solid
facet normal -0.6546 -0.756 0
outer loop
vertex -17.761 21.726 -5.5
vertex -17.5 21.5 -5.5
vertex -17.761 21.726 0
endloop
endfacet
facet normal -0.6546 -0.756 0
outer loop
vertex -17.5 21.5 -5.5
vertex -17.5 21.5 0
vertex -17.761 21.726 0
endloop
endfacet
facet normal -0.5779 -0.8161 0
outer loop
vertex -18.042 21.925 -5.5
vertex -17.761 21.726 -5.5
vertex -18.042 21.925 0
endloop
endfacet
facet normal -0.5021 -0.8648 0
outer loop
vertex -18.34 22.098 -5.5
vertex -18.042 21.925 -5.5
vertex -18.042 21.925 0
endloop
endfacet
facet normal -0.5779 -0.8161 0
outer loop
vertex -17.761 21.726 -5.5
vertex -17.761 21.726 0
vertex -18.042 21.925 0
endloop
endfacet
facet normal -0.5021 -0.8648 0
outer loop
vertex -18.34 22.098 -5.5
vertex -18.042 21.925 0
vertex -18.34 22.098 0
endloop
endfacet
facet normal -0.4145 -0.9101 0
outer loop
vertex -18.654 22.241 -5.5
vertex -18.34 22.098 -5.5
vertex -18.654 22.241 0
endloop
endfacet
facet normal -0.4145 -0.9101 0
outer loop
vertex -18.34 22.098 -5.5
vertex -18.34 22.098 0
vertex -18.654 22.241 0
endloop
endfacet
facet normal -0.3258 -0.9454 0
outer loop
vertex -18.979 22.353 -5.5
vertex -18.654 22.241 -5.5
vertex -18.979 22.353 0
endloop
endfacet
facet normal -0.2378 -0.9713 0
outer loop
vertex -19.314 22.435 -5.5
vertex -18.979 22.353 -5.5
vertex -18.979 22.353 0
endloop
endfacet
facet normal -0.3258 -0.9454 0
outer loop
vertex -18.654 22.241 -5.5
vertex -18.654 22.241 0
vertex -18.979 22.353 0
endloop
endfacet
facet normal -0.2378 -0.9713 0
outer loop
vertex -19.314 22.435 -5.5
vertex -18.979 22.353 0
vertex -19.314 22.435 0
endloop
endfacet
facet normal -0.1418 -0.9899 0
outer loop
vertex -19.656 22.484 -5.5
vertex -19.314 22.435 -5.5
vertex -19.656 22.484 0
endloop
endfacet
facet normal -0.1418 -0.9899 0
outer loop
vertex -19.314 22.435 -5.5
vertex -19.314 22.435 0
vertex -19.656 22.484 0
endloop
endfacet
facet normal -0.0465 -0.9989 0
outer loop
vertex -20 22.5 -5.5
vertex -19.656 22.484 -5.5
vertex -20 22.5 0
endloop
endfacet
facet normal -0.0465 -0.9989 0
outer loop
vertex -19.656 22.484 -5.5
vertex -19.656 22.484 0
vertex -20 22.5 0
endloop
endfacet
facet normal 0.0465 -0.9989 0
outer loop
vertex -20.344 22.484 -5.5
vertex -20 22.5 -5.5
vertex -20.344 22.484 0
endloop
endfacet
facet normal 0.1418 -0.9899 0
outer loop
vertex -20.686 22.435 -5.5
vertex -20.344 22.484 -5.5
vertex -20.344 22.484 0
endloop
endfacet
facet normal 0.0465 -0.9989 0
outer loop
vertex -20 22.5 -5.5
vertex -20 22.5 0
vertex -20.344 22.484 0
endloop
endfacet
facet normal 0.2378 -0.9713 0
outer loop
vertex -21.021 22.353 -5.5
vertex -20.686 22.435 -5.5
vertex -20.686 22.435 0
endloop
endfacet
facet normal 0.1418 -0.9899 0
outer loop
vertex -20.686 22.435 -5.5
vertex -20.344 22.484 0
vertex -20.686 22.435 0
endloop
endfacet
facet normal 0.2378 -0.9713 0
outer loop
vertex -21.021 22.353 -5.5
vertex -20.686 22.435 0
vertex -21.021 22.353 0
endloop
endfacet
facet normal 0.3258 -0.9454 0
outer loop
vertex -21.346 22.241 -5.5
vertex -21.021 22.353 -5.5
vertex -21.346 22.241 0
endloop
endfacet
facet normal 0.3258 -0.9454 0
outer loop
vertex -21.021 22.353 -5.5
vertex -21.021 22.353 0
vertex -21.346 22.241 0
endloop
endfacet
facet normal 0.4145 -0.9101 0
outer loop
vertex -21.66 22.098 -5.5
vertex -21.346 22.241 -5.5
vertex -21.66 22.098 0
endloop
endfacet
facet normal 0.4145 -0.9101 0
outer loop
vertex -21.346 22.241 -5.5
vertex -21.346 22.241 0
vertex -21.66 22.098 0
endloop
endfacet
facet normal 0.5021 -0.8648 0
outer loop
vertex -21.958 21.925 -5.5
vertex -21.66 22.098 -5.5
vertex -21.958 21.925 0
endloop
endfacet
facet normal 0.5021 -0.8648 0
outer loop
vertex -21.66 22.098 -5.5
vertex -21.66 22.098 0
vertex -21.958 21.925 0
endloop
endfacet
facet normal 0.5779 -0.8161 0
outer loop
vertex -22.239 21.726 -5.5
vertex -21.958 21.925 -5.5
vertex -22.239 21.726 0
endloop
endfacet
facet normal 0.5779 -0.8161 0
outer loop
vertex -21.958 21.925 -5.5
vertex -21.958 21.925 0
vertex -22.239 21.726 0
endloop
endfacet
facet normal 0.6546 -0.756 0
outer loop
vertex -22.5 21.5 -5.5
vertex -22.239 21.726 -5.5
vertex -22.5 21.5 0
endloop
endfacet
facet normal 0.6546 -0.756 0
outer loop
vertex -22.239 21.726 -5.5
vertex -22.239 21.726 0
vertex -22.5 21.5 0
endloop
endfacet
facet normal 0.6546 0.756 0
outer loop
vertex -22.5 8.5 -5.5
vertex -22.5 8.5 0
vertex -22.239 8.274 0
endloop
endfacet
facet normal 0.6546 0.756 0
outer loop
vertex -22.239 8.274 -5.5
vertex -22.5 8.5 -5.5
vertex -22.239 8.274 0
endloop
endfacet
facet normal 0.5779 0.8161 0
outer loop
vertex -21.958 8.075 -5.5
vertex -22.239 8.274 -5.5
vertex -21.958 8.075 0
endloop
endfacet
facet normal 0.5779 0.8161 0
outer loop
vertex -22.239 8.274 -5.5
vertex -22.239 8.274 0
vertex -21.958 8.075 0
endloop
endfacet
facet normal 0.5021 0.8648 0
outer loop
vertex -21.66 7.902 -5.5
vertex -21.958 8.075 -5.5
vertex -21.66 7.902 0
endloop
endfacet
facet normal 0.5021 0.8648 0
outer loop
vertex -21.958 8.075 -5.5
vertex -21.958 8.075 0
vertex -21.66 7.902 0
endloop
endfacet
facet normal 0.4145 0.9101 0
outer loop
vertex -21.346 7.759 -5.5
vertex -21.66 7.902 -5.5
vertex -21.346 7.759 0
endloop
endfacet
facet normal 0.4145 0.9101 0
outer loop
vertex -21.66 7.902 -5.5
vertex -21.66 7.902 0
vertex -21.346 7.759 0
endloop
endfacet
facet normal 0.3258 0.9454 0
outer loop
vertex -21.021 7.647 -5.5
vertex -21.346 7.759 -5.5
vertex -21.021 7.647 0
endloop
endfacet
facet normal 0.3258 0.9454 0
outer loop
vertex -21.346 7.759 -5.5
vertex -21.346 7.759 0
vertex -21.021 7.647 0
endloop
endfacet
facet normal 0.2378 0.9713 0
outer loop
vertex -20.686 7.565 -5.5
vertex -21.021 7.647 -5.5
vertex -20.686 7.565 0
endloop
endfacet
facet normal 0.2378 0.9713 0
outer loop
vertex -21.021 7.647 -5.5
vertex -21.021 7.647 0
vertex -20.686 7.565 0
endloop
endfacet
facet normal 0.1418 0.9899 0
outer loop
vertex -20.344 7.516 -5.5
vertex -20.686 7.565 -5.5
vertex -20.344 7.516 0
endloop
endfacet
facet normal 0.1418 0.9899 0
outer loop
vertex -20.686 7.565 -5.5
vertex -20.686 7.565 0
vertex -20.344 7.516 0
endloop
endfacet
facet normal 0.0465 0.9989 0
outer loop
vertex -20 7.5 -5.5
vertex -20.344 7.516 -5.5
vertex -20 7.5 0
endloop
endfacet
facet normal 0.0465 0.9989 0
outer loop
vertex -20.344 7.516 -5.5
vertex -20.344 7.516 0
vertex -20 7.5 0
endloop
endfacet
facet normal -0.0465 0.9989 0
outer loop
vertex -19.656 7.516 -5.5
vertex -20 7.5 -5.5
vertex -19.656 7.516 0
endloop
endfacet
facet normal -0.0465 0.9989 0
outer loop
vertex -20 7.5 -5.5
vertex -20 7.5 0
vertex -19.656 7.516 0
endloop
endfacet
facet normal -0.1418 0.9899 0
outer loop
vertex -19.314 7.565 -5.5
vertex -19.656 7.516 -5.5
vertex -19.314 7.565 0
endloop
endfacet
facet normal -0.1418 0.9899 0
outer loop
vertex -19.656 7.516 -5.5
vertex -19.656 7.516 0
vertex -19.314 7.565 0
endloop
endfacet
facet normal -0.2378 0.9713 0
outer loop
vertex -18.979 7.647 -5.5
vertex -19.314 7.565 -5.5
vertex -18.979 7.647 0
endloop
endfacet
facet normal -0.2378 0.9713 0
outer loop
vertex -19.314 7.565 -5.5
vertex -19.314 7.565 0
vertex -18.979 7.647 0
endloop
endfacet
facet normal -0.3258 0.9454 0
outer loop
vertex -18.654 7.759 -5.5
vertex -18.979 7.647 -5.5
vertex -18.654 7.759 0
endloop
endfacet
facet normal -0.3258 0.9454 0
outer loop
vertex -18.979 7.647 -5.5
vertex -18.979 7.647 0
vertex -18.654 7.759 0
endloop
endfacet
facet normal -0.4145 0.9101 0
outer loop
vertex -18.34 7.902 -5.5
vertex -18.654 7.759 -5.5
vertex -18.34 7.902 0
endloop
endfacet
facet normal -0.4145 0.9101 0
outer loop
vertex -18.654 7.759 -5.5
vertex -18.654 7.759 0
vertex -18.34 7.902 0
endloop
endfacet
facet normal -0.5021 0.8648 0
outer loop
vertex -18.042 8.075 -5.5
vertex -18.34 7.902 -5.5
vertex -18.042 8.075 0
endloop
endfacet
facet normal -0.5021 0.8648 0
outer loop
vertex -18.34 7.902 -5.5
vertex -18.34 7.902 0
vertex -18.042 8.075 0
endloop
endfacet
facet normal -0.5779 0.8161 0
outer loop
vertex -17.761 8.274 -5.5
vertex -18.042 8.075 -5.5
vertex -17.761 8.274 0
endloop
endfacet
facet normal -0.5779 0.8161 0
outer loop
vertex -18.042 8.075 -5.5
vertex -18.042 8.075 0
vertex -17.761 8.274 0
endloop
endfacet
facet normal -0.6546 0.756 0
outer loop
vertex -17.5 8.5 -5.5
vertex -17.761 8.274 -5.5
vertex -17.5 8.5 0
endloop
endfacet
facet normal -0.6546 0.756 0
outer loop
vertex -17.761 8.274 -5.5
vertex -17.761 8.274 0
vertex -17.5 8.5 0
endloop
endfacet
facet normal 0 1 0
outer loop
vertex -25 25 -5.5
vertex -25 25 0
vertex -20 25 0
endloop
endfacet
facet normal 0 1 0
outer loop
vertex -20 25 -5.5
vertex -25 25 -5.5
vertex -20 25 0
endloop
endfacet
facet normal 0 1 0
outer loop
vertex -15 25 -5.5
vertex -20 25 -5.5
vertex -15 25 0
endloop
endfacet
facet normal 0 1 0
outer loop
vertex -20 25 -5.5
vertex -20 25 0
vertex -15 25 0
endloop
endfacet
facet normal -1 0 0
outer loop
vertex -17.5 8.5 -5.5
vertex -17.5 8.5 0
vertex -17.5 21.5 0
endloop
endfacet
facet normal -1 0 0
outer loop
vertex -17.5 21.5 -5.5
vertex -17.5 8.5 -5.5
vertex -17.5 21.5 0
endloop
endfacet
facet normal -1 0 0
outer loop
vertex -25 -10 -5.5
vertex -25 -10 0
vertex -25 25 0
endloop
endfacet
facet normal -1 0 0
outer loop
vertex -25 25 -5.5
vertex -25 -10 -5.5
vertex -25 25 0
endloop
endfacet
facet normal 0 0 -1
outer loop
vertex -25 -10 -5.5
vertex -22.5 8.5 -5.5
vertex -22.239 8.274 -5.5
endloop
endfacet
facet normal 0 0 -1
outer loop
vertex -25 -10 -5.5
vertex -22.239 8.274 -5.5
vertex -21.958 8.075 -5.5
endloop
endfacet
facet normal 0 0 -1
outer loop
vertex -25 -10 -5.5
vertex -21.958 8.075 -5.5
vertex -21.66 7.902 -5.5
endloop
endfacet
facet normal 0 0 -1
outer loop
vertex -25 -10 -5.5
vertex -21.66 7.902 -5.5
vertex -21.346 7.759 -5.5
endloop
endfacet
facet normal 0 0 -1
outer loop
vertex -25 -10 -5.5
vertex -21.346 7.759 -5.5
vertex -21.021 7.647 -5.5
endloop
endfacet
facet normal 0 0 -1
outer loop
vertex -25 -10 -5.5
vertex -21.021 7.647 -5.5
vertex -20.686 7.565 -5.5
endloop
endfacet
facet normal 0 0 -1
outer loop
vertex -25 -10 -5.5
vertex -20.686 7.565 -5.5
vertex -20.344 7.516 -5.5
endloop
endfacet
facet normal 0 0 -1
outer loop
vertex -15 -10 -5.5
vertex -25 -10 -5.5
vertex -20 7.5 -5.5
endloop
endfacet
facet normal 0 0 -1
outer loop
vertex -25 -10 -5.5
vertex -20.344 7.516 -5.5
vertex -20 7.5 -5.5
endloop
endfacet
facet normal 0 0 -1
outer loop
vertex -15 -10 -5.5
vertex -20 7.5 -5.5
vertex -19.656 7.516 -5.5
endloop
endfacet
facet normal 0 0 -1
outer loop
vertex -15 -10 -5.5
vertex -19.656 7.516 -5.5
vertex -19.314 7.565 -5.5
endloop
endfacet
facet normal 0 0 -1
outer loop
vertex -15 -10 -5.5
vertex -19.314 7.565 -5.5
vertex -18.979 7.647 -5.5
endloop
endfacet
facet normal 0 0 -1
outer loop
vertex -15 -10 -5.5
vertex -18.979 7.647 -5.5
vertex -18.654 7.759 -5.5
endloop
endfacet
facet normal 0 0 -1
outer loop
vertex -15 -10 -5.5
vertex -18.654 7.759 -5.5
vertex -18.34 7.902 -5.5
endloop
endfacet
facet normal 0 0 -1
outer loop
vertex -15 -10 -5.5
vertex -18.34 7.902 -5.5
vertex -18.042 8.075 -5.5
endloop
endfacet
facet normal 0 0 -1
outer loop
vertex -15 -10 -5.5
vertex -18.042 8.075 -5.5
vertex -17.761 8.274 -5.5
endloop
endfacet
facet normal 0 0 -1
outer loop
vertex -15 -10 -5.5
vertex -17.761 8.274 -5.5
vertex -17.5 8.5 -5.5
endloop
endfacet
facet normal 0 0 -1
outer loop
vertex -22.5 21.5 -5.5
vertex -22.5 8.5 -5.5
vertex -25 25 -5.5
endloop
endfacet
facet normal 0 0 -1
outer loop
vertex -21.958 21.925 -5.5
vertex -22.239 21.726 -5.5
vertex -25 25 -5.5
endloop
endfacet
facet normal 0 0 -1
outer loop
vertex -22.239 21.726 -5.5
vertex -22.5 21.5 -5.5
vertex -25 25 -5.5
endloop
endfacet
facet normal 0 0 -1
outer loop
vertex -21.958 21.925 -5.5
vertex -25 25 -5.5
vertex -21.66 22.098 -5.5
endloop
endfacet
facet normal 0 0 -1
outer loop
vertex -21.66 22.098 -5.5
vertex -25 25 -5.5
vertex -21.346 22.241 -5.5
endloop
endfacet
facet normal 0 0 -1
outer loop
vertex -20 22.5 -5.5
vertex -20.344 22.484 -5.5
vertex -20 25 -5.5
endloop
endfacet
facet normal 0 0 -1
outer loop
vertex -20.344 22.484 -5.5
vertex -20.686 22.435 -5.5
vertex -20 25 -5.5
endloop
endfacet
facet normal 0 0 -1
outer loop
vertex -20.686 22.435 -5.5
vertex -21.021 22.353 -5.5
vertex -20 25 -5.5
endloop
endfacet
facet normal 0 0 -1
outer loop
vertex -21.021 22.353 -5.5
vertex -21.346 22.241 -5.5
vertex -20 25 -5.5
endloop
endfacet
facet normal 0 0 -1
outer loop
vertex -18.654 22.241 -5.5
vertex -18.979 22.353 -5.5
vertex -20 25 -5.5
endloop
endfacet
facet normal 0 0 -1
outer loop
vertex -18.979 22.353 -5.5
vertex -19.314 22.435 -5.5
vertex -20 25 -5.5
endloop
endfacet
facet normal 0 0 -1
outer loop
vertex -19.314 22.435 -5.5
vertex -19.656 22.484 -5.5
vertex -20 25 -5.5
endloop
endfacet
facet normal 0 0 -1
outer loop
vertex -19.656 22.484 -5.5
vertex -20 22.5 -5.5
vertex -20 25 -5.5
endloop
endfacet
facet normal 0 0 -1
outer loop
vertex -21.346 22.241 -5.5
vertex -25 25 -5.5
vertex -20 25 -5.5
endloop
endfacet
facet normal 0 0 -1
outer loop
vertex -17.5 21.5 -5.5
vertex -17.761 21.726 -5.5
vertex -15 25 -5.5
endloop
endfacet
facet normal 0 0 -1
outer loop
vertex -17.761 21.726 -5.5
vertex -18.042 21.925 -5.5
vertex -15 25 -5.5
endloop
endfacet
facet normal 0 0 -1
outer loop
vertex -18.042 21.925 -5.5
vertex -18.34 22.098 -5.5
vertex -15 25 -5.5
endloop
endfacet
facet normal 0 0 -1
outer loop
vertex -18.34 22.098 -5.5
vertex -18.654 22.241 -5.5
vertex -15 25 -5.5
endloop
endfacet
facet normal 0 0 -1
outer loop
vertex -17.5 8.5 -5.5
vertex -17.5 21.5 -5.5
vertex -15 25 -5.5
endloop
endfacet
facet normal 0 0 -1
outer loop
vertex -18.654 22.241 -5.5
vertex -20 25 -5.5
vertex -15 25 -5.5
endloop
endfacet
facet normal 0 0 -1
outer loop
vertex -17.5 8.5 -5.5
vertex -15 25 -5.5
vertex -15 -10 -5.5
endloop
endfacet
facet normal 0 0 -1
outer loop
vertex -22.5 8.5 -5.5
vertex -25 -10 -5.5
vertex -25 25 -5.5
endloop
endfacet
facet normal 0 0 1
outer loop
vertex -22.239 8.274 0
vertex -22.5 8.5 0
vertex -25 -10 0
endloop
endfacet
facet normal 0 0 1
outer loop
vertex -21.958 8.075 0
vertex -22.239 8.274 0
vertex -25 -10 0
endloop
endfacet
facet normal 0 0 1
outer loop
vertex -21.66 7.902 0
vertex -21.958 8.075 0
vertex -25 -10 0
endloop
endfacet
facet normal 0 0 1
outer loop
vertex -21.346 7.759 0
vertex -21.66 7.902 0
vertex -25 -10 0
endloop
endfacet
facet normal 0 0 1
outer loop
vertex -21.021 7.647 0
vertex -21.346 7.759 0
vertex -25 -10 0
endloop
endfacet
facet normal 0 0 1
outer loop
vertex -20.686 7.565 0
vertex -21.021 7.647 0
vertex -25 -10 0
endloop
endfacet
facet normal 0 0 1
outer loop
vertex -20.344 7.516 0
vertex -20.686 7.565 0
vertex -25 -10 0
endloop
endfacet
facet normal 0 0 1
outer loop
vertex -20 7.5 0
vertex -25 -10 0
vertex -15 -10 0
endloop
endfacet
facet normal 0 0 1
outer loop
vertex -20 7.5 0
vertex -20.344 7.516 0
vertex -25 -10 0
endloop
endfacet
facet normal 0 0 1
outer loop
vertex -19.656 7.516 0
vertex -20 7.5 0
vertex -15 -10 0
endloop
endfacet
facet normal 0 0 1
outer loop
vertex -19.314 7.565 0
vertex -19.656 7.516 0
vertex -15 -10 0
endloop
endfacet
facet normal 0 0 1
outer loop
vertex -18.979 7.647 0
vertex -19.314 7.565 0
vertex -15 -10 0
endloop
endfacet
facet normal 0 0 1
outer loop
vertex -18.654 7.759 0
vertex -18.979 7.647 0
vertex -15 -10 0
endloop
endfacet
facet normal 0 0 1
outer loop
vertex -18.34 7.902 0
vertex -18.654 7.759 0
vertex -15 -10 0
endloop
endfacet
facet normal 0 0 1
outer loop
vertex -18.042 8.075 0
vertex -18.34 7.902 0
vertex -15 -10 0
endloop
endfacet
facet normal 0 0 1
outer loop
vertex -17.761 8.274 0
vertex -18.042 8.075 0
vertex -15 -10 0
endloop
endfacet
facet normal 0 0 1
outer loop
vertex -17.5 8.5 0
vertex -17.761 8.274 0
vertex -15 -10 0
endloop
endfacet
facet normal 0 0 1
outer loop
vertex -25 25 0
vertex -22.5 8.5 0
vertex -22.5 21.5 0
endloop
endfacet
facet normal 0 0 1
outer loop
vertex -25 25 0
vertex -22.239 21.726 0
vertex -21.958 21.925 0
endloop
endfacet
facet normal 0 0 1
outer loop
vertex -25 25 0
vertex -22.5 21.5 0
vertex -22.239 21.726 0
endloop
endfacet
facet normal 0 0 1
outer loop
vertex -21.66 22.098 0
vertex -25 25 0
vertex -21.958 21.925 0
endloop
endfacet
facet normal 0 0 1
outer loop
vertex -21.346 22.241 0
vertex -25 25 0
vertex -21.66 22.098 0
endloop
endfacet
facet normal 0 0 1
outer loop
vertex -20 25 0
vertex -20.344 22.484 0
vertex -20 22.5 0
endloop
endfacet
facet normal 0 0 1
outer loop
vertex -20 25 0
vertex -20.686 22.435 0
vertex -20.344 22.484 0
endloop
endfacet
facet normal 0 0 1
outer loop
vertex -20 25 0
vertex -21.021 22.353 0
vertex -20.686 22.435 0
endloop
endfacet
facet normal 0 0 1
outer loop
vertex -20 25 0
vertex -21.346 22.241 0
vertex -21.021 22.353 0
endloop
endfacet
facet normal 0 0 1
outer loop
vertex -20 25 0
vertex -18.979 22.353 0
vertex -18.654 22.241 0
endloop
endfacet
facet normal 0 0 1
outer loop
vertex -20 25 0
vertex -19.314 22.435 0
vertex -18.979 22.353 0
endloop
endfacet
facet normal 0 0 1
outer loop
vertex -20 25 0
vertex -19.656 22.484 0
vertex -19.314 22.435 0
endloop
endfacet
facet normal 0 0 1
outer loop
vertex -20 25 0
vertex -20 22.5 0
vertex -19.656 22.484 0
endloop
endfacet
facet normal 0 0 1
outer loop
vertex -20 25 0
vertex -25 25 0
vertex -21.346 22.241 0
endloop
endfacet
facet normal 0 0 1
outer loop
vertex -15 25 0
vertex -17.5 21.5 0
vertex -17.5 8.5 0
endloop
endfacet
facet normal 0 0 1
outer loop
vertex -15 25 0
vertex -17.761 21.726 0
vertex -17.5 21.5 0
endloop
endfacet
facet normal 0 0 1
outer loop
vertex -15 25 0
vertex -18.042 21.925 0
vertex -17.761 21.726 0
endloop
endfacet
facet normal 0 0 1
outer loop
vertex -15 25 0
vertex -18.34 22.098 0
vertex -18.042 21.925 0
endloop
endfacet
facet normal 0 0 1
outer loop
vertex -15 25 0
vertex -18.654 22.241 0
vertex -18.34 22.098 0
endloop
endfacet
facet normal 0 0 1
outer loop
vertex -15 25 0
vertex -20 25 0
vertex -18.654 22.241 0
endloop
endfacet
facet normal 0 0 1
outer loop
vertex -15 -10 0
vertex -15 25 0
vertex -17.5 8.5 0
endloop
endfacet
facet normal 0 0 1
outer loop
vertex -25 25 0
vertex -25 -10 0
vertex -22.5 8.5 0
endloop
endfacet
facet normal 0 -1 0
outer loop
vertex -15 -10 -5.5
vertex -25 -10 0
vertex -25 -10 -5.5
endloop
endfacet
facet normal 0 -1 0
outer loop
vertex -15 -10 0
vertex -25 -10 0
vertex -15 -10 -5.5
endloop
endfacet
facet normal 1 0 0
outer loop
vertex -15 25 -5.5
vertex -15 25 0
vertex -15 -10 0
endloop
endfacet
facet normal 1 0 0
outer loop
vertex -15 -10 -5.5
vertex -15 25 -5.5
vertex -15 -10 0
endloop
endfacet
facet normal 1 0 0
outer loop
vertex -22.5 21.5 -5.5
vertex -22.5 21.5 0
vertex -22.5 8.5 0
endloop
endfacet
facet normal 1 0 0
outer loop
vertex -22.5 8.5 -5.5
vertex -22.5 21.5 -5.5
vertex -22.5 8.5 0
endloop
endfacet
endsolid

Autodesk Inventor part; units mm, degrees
ref_plane "YZ Plane" through (0, 0, 0) normal (1, 0, 0) x (0, 1, 0)
ref_plane "XZ Plane" through (0, 0, 0) normal (0, 1, 0) x (-1, 0, 0)
ref_plane "XY Plane" through (0, 0, 0) normal (0, 0, 1) x (1, 0, 0)
sketch "Boceto1" plane through (0, 0, 0) normal (0, 0, 1) x (1, 0, 0)
  line L0 (-50, 0) -> (-50, -10)
  line L1 (-50, -10) -> (-45, -10)
  line L2 (-50, -10) -> (50, -10)
  line L3 (-45, -10) -> (-45, 0)
  line L4 (0, 0) -> (-50, 0)
  arc A0 (-45, 0) -> (-45, -10) centre (-45, -5) ccw
  line L5 (-50, -5) -> (-25, -5)
  line L6 (-25, -5) -> (-25, 25)
  line L7 (-25, 25) -> (-15, 25)
  line L8 (-15, 25) -> (-15, -5)
  line L9 (-15, -5) -> (-25, -5)
  line L10 (-20, 25) -> (-20, 5)
  line L11 (-22.5, 7.5) -> (-17.5, 7.5)
  line L12 (-17.5, 7.5) -> (-17.5, 22.5)
  line L13 (-17.5, 22.5) -> (-22.5, 22.5)
  line L14 (-22.5, 22.5) -> (-22.5, 7.5)
  line L15 (-22.5, 7.5) -> (-17.5, 22.5) construction
  line L16 (-17.5, 7.5) -> (-22.5, 22.5) construction
  line L17 (-22.5, 22.5) -> (-22.5, 21.5)
  line L18 (-22.5, 21.5) -> (-17.5, 21.5)
  line L19 (-22.5, 15) -> (-17.5, 15)
  arc A1 (-17.5, 21.5) -> (-22.5, 21.5) centre (-20, 18.875) ccw
  arc A2 (-22.5, 8.5) -> (-17.5, 8.5) centre (-20, 11.125) ccw
  line L20 (-25, -5) -> (-20, -5)
  line L21 (-20, -5) -> (-20, -10)
  line L22 (-20, -10) -> (-25, -10)
  line L23 (-25, -10) -> (-25, -5)
  line L24 (-25, 0) -> (-15, 0)
  line L25 (-15, -5) -> (-15, -10)
  point P0 (0, -10)
  point P1 (-20, 15)
  point P2 (-50, -5)
  point P3 (-20, 22.5)
  point P4 (-20, 7.5)
  point P5 (-22.5, 8.5)
  point P6 (-17.5, 8.5)
  point P7 (-20, -5)
  point P8 (-17.5, 8.5)
  point P9 (-22.5, 8.5)
  dimension "d0" = 5
  dimension "d1" = 25
  dimension "d2" = 30
  dimension "d3" = 10
  dimension "d4" = 20
  dimension "d5" = 5
  dimension "d6" = 15
  dimension "d7" = 1
extrude "Extrusión1" add sketch "Boceto1" against normal blind 5.5 contours L13 L12 A1 | A1 L14 L13 | L6 L7 L8 L4 | L4 L8 L9 L6 | L23 L9 L21 L2 | L21 L9 L25 L2 | A2 L12 L11 | L11 L14 A2
properties part number "PiezaAux"
